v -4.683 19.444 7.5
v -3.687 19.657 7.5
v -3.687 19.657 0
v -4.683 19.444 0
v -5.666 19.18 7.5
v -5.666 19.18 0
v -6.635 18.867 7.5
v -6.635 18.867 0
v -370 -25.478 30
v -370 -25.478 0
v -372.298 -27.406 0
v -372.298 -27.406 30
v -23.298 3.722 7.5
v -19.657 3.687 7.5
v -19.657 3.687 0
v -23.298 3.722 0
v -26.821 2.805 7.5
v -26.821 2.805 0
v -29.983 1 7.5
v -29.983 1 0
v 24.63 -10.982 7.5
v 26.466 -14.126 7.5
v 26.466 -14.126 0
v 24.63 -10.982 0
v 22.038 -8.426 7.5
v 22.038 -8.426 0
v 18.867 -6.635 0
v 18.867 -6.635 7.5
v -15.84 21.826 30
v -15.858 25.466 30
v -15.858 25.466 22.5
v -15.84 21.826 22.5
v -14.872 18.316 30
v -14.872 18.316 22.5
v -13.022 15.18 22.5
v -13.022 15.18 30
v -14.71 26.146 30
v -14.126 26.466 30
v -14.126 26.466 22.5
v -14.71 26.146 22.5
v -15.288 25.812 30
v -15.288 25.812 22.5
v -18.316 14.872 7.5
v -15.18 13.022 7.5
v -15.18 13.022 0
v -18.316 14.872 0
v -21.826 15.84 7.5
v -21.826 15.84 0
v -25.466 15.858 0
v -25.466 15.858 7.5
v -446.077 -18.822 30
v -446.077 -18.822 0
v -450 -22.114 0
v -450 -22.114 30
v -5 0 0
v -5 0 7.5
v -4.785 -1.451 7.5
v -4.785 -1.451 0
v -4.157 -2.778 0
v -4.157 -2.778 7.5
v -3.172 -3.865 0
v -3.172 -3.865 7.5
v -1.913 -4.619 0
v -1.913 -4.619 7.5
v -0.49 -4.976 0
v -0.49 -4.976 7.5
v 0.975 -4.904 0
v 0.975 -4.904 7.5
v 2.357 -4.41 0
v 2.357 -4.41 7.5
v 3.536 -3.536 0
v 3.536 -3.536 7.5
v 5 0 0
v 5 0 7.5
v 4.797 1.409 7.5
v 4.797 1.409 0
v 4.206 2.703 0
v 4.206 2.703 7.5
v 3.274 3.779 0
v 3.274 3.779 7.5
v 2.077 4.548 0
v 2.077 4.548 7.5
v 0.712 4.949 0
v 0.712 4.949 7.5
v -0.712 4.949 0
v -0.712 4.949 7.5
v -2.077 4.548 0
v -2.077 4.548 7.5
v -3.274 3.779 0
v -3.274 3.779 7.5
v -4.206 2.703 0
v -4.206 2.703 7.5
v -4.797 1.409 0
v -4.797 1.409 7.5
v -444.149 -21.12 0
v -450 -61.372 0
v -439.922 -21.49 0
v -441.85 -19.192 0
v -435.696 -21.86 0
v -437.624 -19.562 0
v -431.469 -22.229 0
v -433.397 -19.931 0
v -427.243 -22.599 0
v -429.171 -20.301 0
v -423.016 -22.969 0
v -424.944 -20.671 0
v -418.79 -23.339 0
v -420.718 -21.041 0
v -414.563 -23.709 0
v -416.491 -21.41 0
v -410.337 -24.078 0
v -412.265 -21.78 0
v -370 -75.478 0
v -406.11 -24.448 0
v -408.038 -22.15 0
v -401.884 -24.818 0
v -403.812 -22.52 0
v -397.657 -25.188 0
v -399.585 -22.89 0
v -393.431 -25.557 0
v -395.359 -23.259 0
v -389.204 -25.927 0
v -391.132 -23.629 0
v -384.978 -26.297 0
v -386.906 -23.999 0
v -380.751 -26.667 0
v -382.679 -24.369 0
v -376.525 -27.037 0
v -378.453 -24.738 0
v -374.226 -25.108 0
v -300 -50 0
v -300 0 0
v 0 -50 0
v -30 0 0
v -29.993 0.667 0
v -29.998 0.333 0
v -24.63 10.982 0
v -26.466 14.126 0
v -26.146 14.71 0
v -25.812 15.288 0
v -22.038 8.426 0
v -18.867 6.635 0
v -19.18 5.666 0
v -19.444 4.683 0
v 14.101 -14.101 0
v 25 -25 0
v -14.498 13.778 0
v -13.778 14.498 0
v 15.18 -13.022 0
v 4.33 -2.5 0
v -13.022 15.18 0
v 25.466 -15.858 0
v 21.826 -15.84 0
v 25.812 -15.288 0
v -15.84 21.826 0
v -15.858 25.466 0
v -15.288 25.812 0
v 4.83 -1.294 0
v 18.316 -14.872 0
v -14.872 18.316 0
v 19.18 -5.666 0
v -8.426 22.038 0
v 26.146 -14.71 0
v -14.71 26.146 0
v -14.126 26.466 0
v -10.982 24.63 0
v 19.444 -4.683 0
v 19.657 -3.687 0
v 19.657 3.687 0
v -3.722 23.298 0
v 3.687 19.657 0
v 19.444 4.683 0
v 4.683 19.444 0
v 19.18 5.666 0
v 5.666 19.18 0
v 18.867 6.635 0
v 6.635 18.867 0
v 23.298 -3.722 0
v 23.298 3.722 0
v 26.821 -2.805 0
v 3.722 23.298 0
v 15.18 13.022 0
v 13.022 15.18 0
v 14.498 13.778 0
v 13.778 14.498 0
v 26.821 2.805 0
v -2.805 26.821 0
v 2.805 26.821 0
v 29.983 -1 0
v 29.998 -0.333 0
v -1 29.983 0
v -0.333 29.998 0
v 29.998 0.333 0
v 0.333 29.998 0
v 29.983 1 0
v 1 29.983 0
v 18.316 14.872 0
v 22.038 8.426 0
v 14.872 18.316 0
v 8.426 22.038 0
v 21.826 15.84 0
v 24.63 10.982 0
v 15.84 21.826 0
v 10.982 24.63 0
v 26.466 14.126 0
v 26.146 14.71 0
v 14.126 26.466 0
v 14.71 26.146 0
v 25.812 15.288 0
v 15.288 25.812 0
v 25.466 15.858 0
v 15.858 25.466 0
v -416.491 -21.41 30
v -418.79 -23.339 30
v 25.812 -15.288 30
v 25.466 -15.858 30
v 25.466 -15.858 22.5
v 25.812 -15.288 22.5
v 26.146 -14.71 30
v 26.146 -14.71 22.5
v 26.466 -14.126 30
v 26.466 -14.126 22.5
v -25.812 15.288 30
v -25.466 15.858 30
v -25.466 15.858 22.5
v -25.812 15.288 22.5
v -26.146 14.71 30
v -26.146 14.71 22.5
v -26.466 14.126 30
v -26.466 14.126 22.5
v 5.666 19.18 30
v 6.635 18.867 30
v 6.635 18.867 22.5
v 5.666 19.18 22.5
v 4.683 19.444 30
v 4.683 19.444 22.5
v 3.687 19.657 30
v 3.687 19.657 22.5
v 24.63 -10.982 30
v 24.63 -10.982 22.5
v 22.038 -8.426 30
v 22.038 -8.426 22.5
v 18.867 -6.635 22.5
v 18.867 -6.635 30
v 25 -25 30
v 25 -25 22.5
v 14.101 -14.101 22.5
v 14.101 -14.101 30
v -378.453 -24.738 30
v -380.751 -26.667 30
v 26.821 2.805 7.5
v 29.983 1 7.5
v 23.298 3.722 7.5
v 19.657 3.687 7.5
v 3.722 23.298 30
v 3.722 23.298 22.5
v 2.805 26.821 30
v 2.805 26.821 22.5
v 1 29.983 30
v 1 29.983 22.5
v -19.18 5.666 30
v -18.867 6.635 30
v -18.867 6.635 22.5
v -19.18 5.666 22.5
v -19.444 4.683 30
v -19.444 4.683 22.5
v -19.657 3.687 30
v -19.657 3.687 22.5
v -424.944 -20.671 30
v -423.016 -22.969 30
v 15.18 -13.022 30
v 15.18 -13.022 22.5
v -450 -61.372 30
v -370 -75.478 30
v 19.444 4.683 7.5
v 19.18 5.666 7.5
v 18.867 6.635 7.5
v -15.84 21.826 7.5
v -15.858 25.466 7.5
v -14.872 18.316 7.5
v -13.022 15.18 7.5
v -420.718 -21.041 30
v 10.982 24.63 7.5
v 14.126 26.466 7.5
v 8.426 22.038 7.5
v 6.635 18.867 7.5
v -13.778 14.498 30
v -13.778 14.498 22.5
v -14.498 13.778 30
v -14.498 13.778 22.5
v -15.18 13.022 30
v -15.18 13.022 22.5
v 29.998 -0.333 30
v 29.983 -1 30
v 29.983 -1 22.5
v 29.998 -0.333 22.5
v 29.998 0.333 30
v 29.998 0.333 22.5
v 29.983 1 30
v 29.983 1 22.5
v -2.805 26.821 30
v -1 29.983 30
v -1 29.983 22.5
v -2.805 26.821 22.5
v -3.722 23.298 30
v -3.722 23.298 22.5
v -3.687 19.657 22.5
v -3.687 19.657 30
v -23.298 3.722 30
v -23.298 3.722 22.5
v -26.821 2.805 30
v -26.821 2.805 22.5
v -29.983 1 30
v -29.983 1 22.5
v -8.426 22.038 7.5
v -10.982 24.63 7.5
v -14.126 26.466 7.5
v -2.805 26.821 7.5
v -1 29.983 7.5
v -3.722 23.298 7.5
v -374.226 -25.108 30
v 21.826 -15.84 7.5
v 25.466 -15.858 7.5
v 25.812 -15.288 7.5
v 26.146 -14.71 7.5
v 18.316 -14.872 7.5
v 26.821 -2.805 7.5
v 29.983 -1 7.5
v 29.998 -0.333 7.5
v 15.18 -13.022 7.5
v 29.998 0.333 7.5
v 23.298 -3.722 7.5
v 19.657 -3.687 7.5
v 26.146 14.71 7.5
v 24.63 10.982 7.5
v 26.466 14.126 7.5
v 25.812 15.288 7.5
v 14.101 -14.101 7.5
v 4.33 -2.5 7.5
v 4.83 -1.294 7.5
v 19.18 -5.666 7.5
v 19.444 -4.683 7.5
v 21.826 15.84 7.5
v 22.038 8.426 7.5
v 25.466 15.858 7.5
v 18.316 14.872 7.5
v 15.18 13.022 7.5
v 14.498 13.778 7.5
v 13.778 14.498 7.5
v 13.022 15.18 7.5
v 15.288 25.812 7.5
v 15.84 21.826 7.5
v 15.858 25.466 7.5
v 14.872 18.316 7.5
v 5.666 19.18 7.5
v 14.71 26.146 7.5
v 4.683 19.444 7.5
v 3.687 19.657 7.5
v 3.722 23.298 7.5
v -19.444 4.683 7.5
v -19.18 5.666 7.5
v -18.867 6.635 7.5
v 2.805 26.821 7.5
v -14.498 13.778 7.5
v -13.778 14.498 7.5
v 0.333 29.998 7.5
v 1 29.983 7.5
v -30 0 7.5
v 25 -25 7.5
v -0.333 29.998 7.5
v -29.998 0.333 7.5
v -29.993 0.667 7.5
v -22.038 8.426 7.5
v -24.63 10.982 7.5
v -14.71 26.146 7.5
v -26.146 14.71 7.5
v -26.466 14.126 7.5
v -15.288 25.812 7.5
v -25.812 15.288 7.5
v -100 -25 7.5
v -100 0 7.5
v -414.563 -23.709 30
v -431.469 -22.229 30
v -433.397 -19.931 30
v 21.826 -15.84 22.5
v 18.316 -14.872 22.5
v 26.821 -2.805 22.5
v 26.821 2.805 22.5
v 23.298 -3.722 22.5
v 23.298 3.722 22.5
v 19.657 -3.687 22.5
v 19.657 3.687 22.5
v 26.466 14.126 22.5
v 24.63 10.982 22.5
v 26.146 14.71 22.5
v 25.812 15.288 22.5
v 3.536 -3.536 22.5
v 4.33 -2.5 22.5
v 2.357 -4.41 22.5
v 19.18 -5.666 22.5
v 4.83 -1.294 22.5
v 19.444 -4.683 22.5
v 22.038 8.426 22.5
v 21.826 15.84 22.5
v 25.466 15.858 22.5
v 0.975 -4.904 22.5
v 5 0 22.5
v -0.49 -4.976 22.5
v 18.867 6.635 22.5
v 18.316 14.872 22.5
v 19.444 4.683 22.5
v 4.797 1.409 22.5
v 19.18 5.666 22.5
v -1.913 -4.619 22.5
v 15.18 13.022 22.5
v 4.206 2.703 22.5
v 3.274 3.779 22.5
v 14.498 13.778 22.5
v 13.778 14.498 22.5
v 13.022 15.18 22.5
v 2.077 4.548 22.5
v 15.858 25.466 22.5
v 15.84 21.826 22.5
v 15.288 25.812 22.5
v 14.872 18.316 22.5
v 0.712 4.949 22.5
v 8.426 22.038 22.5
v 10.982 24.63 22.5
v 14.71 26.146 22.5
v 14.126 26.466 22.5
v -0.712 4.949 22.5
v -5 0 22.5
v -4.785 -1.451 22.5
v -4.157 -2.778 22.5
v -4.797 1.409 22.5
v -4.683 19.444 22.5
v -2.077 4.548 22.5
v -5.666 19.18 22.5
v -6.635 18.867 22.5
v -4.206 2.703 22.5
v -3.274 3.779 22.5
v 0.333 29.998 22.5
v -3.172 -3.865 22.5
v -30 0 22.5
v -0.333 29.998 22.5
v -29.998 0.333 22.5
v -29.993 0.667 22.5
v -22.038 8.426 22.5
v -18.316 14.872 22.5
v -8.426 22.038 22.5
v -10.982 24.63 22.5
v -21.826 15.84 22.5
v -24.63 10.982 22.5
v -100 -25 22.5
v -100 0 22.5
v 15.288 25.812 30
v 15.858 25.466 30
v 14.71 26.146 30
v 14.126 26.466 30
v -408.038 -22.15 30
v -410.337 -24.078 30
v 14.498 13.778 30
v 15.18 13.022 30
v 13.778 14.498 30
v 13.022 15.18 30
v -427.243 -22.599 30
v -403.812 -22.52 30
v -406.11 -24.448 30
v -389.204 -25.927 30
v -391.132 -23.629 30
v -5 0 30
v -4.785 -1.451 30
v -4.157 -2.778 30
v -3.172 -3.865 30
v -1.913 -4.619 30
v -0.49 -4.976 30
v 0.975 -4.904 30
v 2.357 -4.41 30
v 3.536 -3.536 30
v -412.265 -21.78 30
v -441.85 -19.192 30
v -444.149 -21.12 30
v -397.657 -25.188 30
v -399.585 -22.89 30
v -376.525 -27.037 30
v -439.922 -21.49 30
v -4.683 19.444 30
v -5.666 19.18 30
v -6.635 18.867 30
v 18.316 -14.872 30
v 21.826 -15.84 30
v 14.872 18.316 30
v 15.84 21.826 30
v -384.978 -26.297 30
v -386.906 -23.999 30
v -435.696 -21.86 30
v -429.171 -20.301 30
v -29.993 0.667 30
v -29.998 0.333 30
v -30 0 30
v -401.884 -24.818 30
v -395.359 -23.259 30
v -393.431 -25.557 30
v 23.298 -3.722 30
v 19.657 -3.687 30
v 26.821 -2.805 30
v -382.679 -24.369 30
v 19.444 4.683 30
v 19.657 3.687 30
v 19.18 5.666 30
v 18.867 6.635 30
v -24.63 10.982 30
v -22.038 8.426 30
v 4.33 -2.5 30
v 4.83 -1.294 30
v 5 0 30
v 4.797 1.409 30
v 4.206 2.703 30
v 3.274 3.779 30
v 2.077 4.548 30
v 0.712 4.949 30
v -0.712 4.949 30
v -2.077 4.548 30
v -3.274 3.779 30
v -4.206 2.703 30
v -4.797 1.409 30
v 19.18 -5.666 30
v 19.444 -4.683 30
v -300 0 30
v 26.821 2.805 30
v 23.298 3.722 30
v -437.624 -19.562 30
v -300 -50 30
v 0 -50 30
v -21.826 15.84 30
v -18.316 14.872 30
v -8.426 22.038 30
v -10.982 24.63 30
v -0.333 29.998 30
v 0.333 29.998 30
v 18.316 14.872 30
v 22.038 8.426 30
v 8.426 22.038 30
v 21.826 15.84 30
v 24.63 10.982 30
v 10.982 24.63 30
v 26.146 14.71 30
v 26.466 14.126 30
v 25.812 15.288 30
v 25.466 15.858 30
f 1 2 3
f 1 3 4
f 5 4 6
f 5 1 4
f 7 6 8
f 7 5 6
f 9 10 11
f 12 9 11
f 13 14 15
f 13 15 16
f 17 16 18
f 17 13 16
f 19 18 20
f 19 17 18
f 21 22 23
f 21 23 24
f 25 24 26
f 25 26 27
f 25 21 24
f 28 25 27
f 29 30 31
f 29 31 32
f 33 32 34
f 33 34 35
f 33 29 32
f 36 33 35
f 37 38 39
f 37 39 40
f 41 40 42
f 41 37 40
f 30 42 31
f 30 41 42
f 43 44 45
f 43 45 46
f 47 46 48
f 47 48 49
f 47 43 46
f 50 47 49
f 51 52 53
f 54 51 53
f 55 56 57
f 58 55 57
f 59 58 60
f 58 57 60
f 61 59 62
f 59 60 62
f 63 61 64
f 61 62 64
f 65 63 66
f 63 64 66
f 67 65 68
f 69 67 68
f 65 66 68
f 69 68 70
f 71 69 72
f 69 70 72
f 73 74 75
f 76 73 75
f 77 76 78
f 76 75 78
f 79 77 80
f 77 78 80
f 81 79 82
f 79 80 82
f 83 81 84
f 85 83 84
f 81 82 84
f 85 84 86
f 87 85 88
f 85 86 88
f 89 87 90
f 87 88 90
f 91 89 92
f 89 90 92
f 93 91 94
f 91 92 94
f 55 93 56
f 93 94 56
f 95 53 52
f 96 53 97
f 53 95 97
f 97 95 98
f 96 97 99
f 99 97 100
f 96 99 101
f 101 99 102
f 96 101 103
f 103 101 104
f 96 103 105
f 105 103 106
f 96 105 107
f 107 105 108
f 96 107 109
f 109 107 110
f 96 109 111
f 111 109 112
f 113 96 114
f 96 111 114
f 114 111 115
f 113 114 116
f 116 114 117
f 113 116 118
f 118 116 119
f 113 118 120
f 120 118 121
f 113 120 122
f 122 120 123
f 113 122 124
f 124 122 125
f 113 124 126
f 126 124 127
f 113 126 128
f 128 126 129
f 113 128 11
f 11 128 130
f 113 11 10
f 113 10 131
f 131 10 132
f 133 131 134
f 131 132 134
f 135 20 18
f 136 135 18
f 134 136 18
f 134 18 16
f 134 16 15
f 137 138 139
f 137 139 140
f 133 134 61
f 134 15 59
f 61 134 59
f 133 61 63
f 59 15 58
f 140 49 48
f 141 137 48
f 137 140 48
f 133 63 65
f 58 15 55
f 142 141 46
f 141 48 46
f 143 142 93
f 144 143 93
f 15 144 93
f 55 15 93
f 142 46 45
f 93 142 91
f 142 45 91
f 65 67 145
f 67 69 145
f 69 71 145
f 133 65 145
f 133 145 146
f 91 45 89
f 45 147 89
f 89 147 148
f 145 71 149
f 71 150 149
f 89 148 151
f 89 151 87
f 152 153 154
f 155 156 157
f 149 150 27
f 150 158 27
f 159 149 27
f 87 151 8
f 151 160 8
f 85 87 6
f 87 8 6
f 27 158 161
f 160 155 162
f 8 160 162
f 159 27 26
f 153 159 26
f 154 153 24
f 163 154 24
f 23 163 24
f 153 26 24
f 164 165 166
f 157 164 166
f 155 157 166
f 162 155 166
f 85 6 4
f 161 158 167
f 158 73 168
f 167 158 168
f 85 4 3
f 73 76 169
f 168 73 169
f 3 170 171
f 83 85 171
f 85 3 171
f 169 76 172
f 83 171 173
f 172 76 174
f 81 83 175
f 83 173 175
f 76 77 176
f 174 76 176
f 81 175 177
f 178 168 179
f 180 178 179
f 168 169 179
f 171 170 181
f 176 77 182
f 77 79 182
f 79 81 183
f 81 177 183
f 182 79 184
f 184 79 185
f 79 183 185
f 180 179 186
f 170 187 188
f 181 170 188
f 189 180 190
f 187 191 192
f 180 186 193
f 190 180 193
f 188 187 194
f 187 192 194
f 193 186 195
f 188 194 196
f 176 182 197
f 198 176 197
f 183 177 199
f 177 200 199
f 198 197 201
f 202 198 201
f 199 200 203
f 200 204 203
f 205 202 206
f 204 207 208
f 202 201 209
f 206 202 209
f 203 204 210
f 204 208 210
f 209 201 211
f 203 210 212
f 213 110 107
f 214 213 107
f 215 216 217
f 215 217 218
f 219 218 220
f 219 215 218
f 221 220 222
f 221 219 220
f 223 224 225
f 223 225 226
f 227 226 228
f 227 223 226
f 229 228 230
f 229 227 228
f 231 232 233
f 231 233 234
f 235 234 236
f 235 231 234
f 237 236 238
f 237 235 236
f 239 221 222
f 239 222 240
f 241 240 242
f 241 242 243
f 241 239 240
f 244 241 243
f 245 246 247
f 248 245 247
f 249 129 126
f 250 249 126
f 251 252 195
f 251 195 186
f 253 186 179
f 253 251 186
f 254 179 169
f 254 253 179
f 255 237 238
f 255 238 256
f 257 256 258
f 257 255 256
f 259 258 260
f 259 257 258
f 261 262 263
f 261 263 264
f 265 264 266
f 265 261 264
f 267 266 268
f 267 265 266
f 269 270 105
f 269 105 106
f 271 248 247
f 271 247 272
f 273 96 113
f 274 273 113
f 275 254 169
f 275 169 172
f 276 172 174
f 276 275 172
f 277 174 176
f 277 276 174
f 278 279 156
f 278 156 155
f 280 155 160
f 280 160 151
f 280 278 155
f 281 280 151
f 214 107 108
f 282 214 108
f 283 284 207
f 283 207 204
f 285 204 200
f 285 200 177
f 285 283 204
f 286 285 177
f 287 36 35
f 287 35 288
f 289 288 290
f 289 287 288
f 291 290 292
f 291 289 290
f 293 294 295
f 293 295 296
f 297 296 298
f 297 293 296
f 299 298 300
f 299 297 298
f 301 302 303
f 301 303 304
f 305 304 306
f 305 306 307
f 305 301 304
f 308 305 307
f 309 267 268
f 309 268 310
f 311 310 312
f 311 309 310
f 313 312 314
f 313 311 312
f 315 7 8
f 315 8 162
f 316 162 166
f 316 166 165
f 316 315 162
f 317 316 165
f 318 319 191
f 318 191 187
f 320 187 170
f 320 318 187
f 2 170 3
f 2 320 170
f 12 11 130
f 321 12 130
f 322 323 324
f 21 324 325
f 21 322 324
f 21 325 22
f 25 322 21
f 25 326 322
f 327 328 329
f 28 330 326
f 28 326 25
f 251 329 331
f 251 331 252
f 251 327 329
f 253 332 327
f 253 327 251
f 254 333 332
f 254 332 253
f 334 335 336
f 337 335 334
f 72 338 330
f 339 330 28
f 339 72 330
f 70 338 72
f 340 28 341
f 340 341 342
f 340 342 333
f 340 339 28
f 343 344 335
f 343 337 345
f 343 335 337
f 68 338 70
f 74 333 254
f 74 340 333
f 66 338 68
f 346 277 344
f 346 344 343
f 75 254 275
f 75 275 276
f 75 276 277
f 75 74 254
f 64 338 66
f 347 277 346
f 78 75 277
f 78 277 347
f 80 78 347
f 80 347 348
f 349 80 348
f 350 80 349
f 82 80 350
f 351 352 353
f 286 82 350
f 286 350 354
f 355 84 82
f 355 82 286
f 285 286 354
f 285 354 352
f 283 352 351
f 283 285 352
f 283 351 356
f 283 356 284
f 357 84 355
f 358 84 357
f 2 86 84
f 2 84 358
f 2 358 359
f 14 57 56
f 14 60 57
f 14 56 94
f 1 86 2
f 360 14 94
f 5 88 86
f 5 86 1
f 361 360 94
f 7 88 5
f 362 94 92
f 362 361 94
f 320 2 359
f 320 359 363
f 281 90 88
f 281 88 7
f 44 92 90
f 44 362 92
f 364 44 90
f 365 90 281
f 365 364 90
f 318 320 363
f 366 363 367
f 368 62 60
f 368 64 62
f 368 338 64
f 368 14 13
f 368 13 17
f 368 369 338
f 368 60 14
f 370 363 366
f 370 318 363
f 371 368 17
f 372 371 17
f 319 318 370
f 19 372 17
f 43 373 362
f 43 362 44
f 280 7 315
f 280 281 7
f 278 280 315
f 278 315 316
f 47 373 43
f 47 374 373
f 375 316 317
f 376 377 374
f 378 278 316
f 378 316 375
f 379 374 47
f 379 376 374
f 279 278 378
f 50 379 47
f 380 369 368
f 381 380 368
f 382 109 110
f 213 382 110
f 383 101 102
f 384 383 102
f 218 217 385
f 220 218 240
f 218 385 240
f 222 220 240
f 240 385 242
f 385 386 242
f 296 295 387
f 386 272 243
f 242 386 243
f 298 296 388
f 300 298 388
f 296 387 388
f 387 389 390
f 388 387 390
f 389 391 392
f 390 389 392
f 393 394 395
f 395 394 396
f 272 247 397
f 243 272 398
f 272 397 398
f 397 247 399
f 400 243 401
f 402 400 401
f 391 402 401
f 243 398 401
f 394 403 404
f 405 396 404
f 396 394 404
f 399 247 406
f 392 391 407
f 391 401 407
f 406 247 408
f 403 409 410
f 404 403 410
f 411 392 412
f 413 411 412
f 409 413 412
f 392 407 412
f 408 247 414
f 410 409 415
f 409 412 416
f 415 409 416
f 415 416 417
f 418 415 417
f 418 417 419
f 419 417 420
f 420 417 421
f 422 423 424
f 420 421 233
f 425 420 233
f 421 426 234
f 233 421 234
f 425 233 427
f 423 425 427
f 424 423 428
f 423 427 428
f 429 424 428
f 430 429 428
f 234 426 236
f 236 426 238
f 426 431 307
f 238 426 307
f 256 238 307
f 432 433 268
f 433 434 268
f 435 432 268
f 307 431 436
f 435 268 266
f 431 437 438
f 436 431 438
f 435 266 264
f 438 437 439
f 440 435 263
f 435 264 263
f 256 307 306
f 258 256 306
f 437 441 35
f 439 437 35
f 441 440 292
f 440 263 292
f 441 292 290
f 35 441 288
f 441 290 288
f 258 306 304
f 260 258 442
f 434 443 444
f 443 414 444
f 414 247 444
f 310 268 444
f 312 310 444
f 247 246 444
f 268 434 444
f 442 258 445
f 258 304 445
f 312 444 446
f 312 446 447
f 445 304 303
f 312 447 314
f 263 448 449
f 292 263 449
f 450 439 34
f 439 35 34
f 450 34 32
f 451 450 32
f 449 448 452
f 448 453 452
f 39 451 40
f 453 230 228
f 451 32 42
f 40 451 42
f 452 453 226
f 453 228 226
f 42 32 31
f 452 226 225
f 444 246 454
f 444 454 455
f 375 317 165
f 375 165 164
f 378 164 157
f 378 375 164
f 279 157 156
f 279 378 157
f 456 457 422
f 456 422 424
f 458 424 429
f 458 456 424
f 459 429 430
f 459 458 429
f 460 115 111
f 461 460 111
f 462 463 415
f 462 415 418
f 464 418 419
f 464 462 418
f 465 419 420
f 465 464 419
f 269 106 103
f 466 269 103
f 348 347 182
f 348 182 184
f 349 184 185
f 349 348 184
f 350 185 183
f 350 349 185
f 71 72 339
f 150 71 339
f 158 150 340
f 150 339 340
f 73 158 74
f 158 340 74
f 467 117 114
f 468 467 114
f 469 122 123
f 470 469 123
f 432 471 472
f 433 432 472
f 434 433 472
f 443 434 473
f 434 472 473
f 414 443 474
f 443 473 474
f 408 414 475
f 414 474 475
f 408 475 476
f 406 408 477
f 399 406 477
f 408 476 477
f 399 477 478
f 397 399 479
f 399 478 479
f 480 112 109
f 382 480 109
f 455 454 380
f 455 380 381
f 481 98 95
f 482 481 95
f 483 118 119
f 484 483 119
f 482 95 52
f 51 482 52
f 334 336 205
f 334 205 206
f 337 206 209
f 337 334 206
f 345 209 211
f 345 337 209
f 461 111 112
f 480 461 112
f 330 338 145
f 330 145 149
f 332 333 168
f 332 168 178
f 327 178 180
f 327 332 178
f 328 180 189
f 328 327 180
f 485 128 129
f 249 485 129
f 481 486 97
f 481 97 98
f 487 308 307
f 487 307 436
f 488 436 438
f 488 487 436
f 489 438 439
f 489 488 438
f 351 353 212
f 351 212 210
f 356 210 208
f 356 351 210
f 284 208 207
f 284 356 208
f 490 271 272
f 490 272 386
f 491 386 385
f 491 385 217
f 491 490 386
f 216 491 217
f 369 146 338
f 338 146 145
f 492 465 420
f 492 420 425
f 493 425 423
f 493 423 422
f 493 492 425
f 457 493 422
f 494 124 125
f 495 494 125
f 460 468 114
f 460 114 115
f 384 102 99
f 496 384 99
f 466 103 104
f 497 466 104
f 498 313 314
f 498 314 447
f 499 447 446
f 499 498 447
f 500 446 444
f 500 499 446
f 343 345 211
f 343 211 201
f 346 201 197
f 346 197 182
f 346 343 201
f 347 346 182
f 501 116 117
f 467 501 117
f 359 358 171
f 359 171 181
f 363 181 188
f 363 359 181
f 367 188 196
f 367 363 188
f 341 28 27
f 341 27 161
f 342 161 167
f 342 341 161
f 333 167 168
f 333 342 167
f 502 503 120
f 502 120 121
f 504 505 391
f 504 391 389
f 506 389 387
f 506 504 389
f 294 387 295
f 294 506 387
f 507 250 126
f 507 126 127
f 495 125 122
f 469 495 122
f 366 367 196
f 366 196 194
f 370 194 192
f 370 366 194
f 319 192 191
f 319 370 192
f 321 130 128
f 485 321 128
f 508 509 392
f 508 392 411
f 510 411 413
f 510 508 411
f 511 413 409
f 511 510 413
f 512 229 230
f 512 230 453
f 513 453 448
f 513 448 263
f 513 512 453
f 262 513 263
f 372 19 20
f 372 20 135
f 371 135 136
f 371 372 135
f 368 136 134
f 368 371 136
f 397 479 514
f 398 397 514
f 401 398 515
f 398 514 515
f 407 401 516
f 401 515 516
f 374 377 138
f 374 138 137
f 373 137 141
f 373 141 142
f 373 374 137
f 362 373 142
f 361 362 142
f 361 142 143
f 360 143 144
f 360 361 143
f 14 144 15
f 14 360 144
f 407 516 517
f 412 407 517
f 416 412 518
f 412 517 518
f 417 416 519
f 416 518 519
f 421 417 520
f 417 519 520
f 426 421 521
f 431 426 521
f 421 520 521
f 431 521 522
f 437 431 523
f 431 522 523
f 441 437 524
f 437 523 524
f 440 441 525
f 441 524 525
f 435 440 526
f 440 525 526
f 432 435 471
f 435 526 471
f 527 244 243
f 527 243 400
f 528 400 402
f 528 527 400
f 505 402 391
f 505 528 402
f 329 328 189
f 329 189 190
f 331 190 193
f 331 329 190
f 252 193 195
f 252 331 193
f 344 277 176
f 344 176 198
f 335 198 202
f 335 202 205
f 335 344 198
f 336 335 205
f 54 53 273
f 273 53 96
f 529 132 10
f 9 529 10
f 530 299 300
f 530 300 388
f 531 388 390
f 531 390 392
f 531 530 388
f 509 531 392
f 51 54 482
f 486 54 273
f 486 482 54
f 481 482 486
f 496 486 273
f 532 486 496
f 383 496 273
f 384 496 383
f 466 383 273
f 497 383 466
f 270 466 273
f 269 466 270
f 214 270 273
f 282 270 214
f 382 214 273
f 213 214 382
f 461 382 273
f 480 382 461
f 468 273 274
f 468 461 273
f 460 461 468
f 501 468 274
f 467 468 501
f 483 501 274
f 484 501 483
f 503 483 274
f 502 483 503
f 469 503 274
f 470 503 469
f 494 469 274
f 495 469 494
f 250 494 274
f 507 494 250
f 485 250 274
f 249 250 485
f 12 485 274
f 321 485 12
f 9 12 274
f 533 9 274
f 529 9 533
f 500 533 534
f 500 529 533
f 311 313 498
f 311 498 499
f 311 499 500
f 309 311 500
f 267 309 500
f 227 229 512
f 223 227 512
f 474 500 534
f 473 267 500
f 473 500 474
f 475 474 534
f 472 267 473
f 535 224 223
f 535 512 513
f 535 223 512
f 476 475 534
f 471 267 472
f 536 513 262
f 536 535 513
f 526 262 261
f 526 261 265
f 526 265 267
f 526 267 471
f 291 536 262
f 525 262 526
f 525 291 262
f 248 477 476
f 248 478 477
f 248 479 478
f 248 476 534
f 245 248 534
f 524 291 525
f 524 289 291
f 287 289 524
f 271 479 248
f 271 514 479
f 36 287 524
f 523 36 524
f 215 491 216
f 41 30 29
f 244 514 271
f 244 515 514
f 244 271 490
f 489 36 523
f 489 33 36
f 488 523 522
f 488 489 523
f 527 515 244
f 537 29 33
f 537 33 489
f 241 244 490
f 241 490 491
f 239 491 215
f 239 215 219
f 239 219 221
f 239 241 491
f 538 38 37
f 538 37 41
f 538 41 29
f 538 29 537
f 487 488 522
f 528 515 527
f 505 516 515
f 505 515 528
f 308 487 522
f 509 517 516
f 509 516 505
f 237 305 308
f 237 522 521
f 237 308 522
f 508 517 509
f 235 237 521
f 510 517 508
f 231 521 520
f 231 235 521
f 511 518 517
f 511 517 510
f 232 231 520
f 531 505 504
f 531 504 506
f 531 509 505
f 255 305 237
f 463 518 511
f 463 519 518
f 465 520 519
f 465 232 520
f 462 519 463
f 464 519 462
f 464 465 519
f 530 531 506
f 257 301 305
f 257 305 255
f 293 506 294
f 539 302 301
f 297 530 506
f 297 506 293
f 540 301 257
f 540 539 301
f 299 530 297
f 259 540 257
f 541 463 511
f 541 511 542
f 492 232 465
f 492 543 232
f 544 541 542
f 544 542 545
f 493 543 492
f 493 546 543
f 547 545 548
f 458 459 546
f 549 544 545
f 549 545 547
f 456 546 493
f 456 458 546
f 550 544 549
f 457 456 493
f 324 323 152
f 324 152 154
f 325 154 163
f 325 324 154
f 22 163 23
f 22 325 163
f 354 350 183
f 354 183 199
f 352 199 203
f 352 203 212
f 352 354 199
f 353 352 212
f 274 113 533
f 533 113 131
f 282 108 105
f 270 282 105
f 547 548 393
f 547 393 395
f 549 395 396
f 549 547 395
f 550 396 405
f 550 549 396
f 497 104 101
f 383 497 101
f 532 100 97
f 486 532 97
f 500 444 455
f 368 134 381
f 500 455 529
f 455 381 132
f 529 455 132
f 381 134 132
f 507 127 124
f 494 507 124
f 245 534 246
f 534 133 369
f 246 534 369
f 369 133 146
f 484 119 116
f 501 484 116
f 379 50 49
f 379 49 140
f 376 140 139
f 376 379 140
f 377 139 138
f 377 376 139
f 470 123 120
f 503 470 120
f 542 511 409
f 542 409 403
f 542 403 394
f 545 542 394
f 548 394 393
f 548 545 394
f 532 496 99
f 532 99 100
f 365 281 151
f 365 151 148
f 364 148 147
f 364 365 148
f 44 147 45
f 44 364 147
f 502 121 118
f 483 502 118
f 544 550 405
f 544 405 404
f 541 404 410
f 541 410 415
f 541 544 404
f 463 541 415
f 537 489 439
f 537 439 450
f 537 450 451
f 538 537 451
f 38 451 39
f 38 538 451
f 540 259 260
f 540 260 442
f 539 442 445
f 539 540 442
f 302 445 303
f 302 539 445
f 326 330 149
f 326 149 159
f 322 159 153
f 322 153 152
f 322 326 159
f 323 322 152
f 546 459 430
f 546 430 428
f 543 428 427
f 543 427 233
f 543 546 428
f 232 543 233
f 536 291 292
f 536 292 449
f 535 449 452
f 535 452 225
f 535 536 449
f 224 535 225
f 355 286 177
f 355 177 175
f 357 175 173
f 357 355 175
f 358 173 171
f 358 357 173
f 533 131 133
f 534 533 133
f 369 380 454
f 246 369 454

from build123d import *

# Parameters (mm, degrees)
BOSS_EXTRUDE1_DEPTH     = 30
BOSS_EXTRUDE2_DEPTH     = 30
CUT_EXTRUDE1_DEPTH      = 30
CUT_EXTRUDE3_DEPTH      = 43
CUT_EXTRUDE3_DEPTH_BACK = 100
SKETCH4_W               = 74
SKETCH4_H               = 15


with BuildPart() as part:
    # Sketch1 → Boss-Extrude1 (new body)
    with BuildSketch(Plane(origin=(0, 0, 0), x_dir=(0, 1, 0), z_dir=(0, 0, 1))):
        Polygon((0, 0), (0, 300), (-25.477916399, 370), (-27.406279228, 372.298133329), (-25.108145898, 374.226496158), (-27.036508727, 376.524629488), (-24.738375398, 378.452992317), (-26.666738227, 380.751125646), (-24.368604898, 382.679488475), (-26.296967727, 384.977621805), (-23.998834397, 386.905984634), (-25.927197227, 389.204117963), (-23.629063897, 391.132480792), (-25.557426726, 393.430614121), (-23.259293397, 395.35897695), (-25.187656226, 397.65711028), (-22.889522897, 399.585473109), (-24.817885726, 401.883606438), (-22.519752396, 403.811969267), (-24.448115225, 406.110102597), (-22.149981896, 408.038465426), (-24.078344725, 410.336598755), (-21.780211396, 412.264961584), (-23.708574225, 414.563094914), (-21.410440895, 416.491457743), (-23.338803724, 418.789591072), (-21.040670395, 420.717953901), (-22.969033224, 423.01608723), (-20.670899895, 424.944450059), (-22.599262724, 427.242583389), (-20.301129394, 429.170946218), (-22.229492224, 431.469079547), (-19.931358894, 433.397442376), (-21.859721723, 435.695575706), (-19.561588394, 437.623938535), (-21.489951223, 439.922071864), (-19.191817894, 441.850434693), (-21.120180723, 444.148568022), (-18.822047393, 446.076930851), (-22.113893269, 450), (-61.371757942, 450), (-75.477916399, 370), (-50, 300), (-50, 0), (-25, -25), align=None)
    extrude(amount=BOSS_EXTRUDE1_DEPTH)

    # Sketch3 → Boss-Extrude2 (add)
    with BuildSketch(Plane.XY.offset(30)):
        with BuildLine():
            Line((3.535533906, -3.535533906), (14.100912029, -14.100912029))
            Line((14.100912029, -14.100912029), (15.179930074, -13.021893985))
            ThreePointArc((15.179930074, -13.021893985), (20.03858246, -15.472056871), (25.466397806, -15.857571781))
            ThreePointArc((25.466397806, -15.857571781), (25.980762114, -15), (26.466258908, -14.125761553))
            ThreePointArc((26.466258908, -14.125761553), (23.418485529, -9.61789303), (18.867256033, -6.635258079))
            ThreePointArc((18.867256033, -6.635258079), (19.318516526, -5.176380902), (19.657152064, -3.68732596))
            ThreePointArc((19.657152064, -3.68732596), (25.089949902, -3.37990307), (29.983333333, -0.999861101))
            ThreePointArc((29.983333333, -0.999861101), (30, 0), (29.983333333, 0.999861101))
            ThreePointArc((29.983333333, 0.999861101), (25.089949902, 3.37990307), (19.657152064, 3.68732596))
            ThreePointArc((19.657152064, 3.68732596), (19.318516526, 5.176380902), (18.867256033, 6.635258079))
            ThreePointArc((18.867256033, 6.635258079), (23.418485529, 9.61789303), (26.466258908, 14.125761553))
            ThreePointArc((26.466258908, 14.125761553), (25.980762114, 15), (25.466397806, 15.857571781))
            ThreePointArc((25.466397806, 15.857571781), (20.03858246, 15.472056871), (15.179930074, 13.021893985))
            ThreePointArc((15.179930074, 13.021893985), (14.142135624, 14.142135624), (13.021893985, 15.179930074))
            ThreePointArc((13.021893985, 15.179930074), (15.472056871, 20.03858246), (15.857571781, 25.466397806))
            ThreePointArc((15.857571781, 25.466397806), (15, 25.980762114), (14.125761553, 26.466258908))
            ThreePointArc((14.125761553, 26.466258908), (9.61789303, 23.418485529), (6.635258079, 18.867256033))
            ThreePointArc((6.635258079, 18.867256033), (5.176380902, 19.318516526), (3.68732596, 19.657152064))
            ThreePointArc((3.68732596, 19.657152064), (3.37990307, 25.089949902), (0.999861101, 29.983333333))
            ThreePointArc((0.999861101, 29.983333333), (0, 30), (-0.999861101, 29.983333333))
            ThreePointArc((-0.999861101, 29.983333333), (-3.37990307, 25.089949902), (-3.68732596, 19.657152064))
            ThreePointArc((-3.68732596, 19.657152064), (-5.176380902, 19.318516526), (-6.635258079, 18.867256033))
            ThreePointArc((-6.635258079, 18.867256033), (-9.61789303, 23.418485529), (-14.125761553, 26.466258908))
            ThreePointArc((-14.125761553, 26.466258908), (-15, 25.980762114), (-15.857571781, 25.466397806))
            ThreePointArc((-15.857571781, 25.466397806), (-15.472056871, 20.03858246), (-13.021893985, 15.179930074))
            ThreePointArc((-13.021893985, 15.179930074), (-14.142135624, 14.142135624), (-15.179930074, 13.021893985))
            ThreePointArc((-15.179930074, 13.021893985), (-20.03858246, 15.472056871), (-25.466397806, 15.857571781))
            ThreePointArc((-25.466397806, 15.857571781), (-25.980762114, 15), (-26.466258908, 14.125761553))
            ThreePointArc((-26.466258908, 14.125761553), (-23.418485529, 9.61789303), (-18.867256033, 6.635258079))
            ThreePointArc((-18.867256033, 6.635258079), (-19.318516526, 5.176380902), (-19.657152064, 3.68732596))
            ThreePointArc((-19.657152064, 3.68732596), (-25.089949902, 3.37990307), (-29.983333333, 0.999861101))
            ThreePointArc((-29.983333333, 0.999861101), (-29.995833044, 0.5), (-30, 0))
            Line((-30, 0), (-5, 0))
            ThreePointArc((-5, 0), (-1.913417162, -4.619397663), (3.535533906, -3.535533906))
        make_face()
    extrude(amount=-BOSS_EXTRUDE2_DEPTH)

    # Sketch3<6> → Cut-Extrude1 (cut)
    with BuildSketch(Plane.XY.offset(30)):
        with BuildLine():
            Line((0, 0), (3.535533906, -3.535533906))
            ThreePointArc((3.535533906, -3.535533906), (4.619397663, -1.913417162), (5, 0))
            ThreePointArc((5, 0), (0, 5), (-5, 0))
            Line((-5, 0), (0, 0))
        make_face()
        with BuildLine():
            ThreePointArc((-5, 0), (-1.913417162, -4.619397663), (3.535533906, -3.535533906))
            Line((3.535533906, -3.535533906), (0, 0))
            Line((0, 0), (-5, 0))
        make_face()
    extrude(amount=-CUT_EXTRUDE1_DEPTH, mode=Mode.SUBTRACT)

    # Sketch4 → Cut-Extrude3 (cut, two sides: drawn at the far end of the back side and taken through both)
    with BuildSketch(Plane.YZ.offset(-CUT_EXTRUDE3_DEPTH_BACK)):
        with Locations((12, 15)):
            Rectangle(SKETCH4_W, SKETCH4_H)
    extrude(amount=CUT_EXTRUDE3_DEPTH + CUT_EXTRUDE3_DEPTH_BACK, mode=Mode.SUBTRACT)


solid = part.part
